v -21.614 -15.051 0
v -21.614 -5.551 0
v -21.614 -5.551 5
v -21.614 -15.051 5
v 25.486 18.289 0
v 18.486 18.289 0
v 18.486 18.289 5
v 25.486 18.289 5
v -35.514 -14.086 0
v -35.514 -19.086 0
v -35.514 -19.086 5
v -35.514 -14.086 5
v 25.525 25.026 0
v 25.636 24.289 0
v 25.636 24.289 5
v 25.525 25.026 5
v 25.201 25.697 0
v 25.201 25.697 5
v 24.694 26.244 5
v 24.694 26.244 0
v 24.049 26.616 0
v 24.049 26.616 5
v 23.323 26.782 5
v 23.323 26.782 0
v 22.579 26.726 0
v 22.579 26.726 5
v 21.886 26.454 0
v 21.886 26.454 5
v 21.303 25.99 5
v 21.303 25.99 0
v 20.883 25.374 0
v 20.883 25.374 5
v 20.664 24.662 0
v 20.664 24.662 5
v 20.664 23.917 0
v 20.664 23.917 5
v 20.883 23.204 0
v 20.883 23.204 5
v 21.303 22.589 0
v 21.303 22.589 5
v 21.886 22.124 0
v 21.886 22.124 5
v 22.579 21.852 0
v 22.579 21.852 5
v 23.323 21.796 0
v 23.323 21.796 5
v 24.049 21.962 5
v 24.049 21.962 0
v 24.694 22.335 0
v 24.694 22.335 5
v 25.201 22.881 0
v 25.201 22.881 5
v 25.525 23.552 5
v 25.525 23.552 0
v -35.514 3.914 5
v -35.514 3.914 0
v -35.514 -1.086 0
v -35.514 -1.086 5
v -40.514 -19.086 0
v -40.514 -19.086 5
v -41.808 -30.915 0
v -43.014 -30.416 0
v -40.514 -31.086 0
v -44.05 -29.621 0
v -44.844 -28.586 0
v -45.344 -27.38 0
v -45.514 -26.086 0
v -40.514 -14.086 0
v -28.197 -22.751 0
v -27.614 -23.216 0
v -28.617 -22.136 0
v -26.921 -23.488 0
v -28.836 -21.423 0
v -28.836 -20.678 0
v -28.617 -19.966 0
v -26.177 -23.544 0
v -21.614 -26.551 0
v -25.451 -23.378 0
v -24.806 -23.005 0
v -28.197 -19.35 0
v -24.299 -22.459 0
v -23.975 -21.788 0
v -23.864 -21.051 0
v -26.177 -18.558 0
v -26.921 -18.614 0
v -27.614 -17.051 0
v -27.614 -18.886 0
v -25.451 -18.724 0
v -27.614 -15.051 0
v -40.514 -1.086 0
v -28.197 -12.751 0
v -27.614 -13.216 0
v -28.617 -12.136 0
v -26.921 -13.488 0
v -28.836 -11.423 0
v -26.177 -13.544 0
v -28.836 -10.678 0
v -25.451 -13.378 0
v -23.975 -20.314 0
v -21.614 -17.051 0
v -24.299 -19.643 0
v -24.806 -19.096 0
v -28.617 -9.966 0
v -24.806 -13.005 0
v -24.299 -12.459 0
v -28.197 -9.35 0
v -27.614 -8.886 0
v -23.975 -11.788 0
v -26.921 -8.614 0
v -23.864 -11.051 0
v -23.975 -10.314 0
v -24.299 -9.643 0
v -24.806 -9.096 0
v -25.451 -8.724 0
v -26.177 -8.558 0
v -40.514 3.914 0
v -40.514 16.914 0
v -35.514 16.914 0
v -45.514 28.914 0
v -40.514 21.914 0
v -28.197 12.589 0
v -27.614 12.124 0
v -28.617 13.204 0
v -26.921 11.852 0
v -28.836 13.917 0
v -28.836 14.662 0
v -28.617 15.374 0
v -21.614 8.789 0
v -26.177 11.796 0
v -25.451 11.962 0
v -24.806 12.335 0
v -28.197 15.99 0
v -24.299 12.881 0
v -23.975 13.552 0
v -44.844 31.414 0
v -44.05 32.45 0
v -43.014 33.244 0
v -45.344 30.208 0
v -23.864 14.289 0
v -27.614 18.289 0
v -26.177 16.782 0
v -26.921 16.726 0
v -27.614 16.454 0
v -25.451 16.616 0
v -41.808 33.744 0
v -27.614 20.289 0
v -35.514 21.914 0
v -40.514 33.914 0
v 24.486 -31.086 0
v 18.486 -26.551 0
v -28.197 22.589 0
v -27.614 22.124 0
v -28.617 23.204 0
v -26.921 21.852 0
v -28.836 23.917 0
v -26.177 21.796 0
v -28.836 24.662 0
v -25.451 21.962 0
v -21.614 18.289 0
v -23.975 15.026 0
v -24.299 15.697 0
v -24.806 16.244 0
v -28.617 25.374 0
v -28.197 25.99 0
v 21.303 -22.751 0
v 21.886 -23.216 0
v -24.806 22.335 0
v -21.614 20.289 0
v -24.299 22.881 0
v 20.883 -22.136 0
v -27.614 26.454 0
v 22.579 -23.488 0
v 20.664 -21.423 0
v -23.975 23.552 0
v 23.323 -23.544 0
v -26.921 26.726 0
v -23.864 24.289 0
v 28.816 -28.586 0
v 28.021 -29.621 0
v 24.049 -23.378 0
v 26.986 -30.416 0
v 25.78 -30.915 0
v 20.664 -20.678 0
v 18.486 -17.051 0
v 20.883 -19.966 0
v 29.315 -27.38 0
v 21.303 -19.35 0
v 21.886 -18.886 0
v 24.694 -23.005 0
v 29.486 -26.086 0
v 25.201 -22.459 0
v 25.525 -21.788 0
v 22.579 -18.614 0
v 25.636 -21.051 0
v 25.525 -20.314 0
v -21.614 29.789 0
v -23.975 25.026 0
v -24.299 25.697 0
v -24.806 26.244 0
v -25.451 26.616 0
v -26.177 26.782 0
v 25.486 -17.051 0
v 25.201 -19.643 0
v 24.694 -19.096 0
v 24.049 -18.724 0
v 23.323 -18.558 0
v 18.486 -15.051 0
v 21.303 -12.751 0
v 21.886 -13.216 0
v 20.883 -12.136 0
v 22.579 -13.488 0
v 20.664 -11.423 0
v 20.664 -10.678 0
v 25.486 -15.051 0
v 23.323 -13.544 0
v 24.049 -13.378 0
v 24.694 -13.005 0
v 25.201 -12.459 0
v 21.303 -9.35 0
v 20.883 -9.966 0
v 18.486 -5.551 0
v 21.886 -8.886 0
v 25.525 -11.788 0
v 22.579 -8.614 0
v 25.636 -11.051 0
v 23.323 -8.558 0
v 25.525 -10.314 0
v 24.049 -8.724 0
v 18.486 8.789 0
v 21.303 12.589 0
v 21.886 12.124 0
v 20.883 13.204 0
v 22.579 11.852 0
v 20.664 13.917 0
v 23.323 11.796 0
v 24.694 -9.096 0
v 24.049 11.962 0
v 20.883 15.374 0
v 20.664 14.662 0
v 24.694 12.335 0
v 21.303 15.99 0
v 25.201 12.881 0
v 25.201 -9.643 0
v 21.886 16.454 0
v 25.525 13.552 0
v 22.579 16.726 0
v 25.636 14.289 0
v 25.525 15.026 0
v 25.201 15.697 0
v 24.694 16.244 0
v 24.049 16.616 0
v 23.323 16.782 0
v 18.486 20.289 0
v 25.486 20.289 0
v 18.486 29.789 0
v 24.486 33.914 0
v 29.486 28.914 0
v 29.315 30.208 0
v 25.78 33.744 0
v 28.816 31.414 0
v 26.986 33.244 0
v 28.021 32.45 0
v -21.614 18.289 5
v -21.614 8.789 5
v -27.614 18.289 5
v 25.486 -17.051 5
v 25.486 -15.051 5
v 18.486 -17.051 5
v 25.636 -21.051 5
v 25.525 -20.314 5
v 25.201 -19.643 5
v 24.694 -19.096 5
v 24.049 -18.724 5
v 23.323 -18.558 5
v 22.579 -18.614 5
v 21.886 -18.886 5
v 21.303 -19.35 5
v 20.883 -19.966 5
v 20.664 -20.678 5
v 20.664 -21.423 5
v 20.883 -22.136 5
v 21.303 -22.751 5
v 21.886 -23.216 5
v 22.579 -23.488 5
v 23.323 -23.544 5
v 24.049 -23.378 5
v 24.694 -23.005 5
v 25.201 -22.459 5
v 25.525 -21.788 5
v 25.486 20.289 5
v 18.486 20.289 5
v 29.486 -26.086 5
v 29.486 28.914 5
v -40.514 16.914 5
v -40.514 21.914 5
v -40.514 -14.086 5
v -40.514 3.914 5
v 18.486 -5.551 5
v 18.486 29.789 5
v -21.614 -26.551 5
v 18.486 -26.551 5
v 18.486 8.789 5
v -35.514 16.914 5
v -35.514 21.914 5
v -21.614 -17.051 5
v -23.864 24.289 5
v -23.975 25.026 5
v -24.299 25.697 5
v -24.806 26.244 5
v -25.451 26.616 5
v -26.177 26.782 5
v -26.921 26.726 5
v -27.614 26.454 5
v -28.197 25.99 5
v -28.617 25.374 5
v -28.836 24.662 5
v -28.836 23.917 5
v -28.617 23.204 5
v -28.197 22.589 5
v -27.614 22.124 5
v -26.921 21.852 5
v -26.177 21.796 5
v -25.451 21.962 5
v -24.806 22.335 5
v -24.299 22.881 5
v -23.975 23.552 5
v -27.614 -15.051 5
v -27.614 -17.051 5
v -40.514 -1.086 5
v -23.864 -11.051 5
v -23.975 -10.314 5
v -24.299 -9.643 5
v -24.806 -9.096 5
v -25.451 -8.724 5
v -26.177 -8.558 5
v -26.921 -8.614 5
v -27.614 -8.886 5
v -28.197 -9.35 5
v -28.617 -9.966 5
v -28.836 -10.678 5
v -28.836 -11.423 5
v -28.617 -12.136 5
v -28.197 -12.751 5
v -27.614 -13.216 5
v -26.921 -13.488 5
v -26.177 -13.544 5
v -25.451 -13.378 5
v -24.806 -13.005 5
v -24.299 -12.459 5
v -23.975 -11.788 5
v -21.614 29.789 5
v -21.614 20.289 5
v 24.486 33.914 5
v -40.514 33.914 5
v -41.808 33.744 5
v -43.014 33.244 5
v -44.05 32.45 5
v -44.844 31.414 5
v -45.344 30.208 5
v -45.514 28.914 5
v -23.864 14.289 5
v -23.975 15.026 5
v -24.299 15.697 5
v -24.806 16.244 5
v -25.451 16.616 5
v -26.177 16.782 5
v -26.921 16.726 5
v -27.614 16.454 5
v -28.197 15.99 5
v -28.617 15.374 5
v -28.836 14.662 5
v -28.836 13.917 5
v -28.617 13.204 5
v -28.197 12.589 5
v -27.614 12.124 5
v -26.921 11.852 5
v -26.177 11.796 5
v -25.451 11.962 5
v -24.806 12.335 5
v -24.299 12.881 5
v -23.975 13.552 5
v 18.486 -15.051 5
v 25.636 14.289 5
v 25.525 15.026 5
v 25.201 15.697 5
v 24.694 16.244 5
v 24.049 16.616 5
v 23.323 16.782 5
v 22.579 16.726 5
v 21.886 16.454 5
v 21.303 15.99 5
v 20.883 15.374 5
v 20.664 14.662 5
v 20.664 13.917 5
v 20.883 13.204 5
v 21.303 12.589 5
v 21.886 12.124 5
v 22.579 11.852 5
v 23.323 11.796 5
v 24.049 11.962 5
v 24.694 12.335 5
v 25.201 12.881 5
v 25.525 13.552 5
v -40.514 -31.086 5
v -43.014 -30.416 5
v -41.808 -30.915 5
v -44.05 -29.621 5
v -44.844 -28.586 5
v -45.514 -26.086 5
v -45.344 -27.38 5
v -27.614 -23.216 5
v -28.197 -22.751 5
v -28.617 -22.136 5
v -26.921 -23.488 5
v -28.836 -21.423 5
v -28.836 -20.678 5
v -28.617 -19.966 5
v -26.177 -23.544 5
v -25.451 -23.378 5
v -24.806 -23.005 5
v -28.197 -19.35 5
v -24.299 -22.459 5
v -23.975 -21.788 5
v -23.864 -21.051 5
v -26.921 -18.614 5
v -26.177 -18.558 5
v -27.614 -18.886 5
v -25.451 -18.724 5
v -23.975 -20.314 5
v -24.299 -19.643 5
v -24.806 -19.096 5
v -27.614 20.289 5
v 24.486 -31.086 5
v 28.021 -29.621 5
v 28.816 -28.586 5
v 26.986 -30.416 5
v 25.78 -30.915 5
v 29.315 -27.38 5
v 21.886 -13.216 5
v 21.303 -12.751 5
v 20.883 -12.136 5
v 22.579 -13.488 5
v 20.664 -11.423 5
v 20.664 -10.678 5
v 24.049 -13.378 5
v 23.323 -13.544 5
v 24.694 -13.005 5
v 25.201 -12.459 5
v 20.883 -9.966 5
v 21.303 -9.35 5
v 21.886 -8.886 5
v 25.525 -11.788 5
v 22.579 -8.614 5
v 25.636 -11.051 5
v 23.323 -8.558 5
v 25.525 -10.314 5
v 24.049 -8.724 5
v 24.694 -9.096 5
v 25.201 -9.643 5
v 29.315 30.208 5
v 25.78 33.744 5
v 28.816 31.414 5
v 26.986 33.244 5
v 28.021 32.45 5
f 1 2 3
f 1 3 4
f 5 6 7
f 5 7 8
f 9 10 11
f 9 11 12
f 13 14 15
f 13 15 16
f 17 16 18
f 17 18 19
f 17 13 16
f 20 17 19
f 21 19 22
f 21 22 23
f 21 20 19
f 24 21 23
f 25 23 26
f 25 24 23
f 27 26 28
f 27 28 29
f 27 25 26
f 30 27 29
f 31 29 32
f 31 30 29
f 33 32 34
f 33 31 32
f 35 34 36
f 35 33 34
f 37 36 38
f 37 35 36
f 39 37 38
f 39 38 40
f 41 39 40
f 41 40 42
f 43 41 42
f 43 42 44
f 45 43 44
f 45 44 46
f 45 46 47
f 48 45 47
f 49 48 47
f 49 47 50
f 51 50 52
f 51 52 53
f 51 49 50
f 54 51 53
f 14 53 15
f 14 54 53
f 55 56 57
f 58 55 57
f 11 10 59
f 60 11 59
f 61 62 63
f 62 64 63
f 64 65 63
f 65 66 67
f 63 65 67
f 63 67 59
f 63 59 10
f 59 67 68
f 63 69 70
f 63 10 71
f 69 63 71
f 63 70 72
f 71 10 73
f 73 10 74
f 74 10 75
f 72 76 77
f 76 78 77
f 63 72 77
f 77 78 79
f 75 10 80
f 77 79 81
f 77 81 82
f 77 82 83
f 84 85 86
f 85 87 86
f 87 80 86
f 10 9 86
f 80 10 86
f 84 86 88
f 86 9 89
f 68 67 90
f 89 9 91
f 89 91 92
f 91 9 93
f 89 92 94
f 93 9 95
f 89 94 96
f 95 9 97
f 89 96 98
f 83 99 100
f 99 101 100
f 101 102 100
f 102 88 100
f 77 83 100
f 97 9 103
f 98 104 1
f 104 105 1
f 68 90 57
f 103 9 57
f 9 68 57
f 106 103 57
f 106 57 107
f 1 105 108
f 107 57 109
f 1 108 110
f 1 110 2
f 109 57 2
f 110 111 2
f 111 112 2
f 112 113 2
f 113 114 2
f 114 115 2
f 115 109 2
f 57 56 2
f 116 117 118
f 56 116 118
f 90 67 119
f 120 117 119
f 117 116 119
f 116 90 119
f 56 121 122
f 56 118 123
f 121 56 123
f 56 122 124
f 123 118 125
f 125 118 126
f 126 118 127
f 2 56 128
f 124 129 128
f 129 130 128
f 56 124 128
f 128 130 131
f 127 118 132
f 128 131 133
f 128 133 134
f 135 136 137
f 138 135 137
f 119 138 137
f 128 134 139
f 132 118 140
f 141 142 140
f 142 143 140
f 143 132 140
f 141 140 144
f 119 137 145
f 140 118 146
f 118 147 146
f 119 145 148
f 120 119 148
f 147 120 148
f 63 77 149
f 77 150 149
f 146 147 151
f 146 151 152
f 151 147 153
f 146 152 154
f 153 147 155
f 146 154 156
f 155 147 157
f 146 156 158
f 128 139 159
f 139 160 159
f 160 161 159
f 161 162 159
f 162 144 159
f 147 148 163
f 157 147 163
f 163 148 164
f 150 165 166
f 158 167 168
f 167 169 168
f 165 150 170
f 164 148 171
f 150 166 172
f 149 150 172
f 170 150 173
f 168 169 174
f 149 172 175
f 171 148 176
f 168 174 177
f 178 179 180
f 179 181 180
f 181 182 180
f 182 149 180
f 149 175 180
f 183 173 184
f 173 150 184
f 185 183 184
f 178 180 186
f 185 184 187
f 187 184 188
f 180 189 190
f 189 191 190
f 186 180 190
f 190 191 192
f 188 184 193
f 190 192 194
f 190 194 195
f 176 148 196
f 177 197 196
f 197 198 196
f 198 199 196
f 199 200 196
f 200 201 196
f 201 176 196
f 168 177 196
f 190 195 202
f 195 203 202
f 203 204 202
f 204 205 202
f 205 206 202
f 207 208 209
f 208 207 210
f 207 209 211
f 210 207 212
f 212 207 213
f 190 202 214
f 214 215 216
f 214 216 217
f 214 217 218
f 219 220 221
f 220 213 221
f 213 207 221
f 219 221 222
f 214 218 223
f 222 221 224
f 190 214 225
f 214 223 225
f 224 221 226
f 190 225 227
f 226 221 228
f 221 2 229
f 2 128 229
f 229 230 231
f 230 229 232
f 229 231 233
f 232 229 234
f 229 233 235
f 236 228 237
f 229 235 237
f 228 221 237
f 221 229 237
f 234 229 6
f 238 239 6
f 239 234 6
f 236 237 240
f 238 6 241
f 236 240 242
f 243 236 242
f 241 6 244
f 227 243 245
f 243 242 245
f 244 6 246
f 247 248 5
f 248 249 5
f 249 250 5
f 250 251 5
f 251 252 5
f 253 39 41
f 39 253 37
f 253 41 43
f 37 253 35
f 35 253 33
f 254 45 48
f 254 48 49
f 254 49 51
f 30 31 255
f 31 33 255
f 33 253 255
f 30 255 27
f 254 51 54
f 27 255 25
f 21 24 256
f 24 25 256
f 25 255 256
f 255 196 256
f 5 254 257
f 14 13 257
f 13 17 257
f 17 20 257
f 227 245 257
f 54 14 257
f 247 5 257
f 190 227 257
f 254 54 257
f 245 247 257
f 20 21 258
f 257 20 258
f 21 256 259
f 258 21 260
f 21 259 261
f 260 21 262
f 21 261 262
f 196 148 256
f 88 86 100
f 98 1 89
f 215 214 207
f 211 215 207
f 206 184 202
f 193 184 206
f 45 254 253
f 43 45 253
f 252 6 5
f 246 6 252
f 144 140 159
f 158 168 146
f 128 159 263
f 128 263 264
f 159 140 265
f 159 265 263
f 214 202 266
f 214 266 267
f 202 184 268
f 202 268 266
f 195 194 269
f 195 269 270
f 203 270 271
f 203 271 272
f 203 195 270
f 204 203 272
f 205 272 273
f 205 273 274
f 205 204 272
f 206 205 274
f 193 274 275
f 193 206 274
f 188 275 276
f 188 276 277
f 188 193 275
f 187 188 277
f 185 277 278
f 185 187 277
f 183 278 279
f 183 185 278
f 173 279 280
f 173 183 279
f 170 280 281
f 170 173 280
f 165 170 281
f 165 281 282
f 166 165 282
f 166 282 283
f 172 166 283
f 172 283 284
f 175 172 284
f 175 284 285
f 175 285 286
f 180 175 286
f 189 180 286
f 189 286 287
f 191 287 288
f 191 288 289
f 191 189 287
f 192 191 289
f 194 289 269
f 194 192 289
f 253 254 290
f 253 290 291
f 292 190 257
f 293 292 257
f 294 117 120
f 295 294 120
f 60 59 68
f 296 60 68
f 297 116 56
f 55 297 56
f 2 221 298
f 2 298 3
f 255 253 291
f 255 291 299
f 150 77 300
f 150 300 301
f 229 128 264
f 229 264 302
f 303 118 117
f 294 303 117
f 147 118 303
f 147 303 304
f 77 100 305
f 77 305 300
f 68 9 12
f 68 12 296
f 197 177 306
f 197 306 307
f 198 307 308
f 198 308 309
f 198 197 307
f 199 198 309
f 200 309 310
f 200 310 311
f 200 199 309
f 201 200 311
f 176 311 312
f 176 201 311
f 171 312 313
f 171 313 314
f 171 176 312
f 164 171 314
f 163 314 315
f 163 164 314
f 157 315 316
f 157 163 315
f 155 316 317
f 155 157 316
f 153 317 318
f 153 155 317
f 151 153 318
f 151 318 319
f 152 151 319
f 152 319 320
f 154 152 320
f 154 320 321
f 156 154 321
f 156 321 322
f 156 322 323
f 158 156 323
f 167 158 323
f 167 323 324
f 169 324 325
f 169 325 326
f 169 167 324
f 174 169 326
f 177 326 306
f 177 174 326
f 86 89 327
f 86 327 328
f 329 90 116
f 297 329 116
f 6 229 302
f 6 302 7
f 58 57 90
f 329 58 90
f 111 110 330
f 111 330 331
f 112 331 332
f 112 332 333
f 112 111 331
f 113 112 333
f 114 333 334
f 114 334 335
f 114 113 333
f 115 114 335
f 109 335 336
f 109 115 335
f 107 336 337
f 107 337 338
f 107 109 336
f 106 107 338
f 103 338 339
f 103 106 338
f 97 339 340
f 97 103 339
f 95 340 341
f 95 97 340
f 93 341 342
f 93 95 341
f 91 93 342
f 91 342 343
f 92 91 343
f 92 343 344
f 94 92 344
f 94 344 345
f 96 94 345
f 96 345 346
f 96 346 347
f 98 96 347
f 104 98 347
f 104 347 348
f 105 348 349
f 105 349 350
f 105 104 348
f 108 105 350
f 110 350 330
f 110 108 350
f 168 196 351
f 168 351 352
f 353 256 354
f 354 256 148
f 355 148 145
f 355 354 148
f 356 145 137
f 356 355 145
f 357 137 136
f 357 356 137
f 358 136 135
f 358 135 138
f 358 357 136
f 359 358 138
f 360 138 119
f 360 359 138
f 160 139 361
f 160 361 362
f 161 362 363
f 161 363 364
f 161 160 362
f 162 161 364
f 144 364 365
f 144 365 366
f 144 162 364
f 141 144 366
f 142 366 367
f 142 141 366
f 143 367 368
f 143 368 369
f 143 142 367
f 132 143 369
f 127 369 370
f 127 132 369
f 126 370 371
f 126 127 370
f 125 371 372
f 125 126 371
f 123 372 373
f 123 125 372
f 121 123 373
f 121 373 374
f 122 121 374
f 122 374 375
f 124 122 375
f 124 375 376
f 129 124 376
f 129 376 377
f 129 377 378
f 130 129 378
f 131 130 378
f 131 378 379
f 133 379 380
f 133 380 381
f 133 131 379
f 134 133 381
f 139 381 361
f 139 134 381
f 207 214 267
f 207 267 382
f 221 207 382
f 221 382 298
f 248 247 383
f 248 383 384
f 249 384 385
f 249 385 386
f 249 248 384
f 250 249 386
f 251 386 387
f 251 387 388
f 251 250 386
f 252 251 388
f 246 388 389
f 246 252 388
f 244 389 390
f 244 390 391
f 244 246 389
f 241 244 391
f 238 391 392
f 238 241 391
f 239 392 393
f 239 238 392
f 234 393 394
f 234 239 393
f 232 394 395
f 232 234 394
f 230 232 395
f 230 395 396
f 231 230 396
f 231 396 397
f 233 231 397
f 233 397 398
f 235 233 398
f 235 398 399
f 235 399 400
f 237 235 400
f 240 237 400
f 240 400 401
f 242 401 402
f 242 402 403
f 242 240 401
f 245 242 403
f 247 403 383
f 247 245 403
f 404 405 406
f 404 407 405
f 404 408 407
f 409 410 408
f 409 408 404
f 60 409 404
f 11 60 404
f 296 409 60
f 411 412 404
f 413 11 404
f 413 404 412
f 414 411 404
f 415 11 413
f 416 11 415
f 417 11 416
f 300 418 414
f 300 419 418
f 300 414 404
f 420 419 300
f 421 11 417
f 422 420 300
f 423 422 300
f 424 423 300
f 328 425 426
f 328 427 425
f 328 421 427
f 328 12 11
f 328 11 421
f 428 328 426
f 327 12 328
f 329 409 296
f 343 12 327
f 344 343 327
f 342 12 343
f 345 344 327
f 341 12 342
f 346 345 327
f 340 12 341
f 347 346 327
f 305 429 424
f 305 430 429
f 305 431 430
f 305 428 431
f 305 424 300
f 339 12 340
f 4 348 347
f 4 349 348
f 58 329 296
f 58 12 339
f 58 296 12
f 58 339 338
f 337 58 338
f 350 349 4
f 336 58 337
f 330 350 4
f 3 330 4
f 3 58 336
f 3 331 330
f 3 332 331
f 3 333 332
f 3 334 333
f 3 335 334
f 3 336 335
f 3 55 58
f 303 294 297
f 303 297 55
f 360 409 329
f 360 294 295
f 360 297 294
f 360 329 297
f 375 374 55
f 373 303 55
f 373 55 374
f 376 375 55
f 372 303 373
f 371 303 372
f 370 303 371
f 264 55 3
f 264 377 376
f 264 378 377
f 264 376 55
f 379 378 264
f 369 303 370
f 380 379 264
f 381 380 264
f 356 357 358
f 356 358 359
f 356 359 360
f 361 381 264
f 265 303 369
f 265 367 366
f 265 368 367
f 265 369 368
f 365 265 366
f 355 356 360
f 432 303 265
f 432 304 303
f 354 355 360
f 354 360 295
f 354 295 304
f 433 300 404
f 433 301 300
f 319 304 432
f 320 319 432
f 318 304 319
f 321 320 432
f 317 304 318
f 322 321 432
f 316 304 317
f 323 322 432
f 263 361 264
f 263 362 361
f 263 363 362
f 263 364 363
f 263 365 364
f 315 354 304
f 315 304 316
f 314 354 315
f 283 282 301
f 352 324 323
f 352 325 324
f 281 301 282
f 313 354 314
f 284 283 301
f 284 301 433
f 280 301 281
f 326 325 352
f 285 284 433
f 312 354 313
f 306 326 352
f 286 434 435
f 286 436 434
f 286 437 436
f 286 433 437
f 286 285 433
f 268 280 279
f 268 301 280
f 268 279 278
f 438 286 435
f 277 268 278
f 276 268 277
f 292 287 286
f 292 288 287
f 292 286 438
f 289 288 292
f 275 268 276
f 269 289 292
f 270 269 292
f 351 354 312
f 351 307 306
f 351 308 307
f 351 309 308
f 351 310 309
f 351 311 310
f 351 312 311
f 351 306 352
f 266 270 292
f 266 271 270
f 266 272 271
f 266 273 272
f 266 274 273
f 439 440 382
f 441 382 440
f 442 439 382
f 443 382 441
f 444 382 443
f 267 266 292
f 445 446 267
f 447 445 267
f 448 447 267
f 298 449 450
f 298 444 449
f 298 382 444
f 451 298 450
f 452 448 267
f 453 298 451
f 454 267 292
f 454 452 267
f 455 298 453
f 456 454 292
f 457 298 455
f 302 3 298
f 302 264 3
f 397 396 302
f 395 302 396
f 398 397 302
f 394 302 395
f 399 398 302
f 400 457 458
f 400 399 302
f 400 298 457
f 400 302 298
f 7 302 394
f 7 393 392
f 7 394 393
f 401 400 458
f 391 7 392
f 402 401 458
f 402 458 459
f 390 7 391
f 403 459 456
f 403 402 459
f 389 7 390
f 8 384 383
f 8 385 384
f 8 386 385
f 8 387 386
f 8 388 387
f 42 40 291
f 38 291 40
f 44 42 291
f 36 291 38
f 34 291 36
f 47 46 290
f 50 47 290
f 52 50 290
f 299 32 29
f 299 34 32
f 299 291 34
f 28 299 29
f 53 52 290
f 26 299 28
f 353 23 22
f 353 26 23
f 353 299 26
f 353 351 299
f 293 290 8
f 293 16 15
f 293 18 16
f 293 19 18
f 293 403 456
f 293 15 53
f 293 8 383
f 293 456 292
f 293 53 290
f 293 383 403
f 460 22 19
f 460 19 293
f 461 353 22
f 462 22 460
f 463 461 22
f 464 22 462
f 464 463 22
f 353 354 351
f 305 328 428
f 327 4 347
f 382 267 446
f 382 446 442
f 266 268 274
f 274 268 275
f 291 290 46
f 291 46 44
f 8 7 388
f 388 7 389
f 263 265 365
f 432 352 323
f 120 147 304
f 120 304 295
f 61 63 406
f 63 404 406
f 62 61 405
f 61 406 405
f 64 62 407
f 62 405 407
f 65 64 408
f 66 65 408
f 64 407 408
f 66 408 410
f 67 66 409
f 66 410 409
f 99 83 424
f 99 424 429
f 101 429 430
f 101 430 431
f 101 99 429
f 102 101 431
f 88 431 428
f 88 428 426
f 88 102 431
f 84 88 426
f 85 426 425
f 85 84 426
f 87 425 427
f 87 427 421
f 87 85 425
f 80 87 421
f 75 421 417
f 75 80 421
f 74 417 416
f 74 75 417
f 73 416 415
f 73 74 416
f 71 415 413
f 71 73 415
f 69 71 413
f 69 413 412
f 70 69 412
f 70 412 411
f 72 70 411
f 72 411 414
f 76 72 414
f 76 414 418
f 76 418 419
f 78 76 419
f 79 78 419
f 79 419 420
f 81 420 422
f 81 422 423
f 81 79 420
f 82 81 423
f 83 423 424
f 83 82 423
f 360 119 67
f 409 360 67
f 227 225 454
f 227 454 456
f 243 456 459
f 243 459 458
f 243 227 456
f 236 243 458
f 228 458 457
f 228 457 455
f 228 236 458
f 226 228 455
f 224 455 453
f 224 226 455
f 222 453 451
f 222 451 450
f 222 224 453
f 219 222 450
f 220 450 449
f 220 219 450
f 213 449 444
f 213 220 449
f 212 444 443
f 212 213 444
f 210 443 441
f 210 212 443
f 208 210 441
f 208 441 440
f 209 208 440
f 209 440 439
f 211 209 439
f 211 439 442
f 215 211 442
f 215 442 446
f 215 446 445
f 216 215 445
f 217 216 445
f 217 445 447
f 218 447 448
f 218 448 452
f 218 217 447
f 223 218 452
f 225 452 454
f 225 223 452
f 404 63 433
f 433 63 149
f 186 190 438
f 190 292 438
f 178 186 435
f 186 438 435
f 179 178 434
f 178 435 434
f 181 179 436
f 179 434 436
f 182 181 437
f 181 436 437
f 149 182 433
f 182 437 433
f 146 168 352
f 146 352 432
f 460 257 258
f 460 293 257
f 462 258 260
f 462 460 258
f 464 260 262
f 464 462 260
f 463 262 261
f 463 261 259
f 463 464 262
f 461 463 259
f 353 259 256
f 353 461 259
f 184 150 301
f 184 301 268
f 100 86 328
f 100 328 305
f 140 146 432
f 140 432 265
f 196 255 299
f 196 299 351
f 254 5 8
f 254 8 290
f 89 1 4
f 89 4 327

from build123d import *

# Parameters (mm, degrees)
SKETCH_4_R          = 2.5
EXTRUDE_1_DEPTH     = 5
SKETCH_5_W          = 5
SKETCH_5_H          = 5
CUT_EXTRUDE_5_DEPTH = 5
FILLET_1_R          = 5


with BuildPart() as part:
    # 草图4 → 凸台-拉伸1 (new body)
    with BuildSketch(Plane.XY):
        Polygon((-30.514243596, -31.085830111), (29.485756404, -31.085830111), (29.485756404, 33.914169889), (-30.514243596, 33.914169889), (-45.514243596, 33.914169889), (-45.514243596, -31.085830111), align=None)
        with Locations((23.135756404, 24.289169889)):
            Circle(SKETCH_4_R, mode=Mode.SUBTRACT)
        with Locations((23.135756404, 14.289169889)):
            Circle(SKETCH_4_R, mode=Mode.SUBTRACT)
        with Locations((23.135756404, -11.050830111)):
            Circle(SKETCH_4_R, mode=Mode.SUBTRACT)
        with Locations((23.135756404, -21.050830111)):
            Circle(SKETCH_4_R, mode=Mode.SUBTRACT)
        with Locations((-26.364243596, -21.050830111)):
            Circle(SKETCH_4_R, mode=Mode.SUBTRACT)
        with Locations((-26.364243596, -11.050830111)):
            Circle(SKETCH_4_R, mode=Mode.SUBTRACT)
        with Locations((-26.364243596, 14.289169889)):
            Circle(SKETCH_4_R, mode=Mode.SUBTRACT)
        with Locations((-26.364243596, 24.289169889)):
            Circle(SKETCH_4_R, mode=Mode.SUBTRACT)
        Polygon((-27.614243596, -17.050830111), (-21.614243596, -17.050830111), (-21.614243596, -26.550830111), (18.485756404, -26.550830111), (18.485756404, -17.050830111), (25.485756404, -17.050830111), (25.485756404, -15.050830111), (18.485756404, -15.050830111), (18.485756404, -5.550830111), (-21.614243596, -5.550830111), (-21.614243596, -15.050830111), (-27.614243596, -15.050830111), align=None, mode=Mode.SUBTRACT)
        Polygon((18.485756404, 29.789169889), (-21.614243596, 29.789169889), (-21.614243596, 20.289169889), (-27.614243596, 20.289169889), (-27.614243596, 18.289169889), (-21.614243596, 18.289169889), (-21.614243596, 8.789169889), (18.485756404, 8.789169889), (18.485756404, 18.289169889), (25.485756404, 18.289169889), (25.485756404, 20.289169889), (18.485756404, 20.289169889), align=None, mode=Mode.SUBTRACT)
    extrude(amount=EXTRUDE_1_DEPTH)

    # 草图5 → 切除-拉伸5 (cut)
    with BuildSketch(Plane(origin=(0, 0, 0), x_dir=(-1, 0, 0), z_dir=(0, 0, -1))):
        Polygon((40.514243596, -1.085830111), (40.514243596, 1.414169889), (40.514243596, 3.914169889), (35.514243596, 3.914169889), (35.514243596, -1.085830111), align=None)
        with Locations((38.014243596, 19.414169889)):
            Rectangle(SKETCH_5_W, SKETCH_5_H)
        with Locations((38.014243596, -16.585830111)):
            Rectangle(SKETCH_5_W, SKETCH_5_H)
    extrude(amount=-CUT_EXTRUDE_5_DEPTH, mode=Mode.SUBTRACT)

    # 圆角1
    fillet_1_edges = [part.edges().sort_by_distance(p)[0] for p in [
        (-45.514243596, -31.085830111, 2.5),
        (-45.514243596, 33.914169889, 2.5),
        (29.485756404, 33.914169889, 2.5),
        (29.485756404, -31.085830111, 2.5),
    ]]
    fillet(fillet_1_edges, radius=FILLET_1_R)


solid = part.part
